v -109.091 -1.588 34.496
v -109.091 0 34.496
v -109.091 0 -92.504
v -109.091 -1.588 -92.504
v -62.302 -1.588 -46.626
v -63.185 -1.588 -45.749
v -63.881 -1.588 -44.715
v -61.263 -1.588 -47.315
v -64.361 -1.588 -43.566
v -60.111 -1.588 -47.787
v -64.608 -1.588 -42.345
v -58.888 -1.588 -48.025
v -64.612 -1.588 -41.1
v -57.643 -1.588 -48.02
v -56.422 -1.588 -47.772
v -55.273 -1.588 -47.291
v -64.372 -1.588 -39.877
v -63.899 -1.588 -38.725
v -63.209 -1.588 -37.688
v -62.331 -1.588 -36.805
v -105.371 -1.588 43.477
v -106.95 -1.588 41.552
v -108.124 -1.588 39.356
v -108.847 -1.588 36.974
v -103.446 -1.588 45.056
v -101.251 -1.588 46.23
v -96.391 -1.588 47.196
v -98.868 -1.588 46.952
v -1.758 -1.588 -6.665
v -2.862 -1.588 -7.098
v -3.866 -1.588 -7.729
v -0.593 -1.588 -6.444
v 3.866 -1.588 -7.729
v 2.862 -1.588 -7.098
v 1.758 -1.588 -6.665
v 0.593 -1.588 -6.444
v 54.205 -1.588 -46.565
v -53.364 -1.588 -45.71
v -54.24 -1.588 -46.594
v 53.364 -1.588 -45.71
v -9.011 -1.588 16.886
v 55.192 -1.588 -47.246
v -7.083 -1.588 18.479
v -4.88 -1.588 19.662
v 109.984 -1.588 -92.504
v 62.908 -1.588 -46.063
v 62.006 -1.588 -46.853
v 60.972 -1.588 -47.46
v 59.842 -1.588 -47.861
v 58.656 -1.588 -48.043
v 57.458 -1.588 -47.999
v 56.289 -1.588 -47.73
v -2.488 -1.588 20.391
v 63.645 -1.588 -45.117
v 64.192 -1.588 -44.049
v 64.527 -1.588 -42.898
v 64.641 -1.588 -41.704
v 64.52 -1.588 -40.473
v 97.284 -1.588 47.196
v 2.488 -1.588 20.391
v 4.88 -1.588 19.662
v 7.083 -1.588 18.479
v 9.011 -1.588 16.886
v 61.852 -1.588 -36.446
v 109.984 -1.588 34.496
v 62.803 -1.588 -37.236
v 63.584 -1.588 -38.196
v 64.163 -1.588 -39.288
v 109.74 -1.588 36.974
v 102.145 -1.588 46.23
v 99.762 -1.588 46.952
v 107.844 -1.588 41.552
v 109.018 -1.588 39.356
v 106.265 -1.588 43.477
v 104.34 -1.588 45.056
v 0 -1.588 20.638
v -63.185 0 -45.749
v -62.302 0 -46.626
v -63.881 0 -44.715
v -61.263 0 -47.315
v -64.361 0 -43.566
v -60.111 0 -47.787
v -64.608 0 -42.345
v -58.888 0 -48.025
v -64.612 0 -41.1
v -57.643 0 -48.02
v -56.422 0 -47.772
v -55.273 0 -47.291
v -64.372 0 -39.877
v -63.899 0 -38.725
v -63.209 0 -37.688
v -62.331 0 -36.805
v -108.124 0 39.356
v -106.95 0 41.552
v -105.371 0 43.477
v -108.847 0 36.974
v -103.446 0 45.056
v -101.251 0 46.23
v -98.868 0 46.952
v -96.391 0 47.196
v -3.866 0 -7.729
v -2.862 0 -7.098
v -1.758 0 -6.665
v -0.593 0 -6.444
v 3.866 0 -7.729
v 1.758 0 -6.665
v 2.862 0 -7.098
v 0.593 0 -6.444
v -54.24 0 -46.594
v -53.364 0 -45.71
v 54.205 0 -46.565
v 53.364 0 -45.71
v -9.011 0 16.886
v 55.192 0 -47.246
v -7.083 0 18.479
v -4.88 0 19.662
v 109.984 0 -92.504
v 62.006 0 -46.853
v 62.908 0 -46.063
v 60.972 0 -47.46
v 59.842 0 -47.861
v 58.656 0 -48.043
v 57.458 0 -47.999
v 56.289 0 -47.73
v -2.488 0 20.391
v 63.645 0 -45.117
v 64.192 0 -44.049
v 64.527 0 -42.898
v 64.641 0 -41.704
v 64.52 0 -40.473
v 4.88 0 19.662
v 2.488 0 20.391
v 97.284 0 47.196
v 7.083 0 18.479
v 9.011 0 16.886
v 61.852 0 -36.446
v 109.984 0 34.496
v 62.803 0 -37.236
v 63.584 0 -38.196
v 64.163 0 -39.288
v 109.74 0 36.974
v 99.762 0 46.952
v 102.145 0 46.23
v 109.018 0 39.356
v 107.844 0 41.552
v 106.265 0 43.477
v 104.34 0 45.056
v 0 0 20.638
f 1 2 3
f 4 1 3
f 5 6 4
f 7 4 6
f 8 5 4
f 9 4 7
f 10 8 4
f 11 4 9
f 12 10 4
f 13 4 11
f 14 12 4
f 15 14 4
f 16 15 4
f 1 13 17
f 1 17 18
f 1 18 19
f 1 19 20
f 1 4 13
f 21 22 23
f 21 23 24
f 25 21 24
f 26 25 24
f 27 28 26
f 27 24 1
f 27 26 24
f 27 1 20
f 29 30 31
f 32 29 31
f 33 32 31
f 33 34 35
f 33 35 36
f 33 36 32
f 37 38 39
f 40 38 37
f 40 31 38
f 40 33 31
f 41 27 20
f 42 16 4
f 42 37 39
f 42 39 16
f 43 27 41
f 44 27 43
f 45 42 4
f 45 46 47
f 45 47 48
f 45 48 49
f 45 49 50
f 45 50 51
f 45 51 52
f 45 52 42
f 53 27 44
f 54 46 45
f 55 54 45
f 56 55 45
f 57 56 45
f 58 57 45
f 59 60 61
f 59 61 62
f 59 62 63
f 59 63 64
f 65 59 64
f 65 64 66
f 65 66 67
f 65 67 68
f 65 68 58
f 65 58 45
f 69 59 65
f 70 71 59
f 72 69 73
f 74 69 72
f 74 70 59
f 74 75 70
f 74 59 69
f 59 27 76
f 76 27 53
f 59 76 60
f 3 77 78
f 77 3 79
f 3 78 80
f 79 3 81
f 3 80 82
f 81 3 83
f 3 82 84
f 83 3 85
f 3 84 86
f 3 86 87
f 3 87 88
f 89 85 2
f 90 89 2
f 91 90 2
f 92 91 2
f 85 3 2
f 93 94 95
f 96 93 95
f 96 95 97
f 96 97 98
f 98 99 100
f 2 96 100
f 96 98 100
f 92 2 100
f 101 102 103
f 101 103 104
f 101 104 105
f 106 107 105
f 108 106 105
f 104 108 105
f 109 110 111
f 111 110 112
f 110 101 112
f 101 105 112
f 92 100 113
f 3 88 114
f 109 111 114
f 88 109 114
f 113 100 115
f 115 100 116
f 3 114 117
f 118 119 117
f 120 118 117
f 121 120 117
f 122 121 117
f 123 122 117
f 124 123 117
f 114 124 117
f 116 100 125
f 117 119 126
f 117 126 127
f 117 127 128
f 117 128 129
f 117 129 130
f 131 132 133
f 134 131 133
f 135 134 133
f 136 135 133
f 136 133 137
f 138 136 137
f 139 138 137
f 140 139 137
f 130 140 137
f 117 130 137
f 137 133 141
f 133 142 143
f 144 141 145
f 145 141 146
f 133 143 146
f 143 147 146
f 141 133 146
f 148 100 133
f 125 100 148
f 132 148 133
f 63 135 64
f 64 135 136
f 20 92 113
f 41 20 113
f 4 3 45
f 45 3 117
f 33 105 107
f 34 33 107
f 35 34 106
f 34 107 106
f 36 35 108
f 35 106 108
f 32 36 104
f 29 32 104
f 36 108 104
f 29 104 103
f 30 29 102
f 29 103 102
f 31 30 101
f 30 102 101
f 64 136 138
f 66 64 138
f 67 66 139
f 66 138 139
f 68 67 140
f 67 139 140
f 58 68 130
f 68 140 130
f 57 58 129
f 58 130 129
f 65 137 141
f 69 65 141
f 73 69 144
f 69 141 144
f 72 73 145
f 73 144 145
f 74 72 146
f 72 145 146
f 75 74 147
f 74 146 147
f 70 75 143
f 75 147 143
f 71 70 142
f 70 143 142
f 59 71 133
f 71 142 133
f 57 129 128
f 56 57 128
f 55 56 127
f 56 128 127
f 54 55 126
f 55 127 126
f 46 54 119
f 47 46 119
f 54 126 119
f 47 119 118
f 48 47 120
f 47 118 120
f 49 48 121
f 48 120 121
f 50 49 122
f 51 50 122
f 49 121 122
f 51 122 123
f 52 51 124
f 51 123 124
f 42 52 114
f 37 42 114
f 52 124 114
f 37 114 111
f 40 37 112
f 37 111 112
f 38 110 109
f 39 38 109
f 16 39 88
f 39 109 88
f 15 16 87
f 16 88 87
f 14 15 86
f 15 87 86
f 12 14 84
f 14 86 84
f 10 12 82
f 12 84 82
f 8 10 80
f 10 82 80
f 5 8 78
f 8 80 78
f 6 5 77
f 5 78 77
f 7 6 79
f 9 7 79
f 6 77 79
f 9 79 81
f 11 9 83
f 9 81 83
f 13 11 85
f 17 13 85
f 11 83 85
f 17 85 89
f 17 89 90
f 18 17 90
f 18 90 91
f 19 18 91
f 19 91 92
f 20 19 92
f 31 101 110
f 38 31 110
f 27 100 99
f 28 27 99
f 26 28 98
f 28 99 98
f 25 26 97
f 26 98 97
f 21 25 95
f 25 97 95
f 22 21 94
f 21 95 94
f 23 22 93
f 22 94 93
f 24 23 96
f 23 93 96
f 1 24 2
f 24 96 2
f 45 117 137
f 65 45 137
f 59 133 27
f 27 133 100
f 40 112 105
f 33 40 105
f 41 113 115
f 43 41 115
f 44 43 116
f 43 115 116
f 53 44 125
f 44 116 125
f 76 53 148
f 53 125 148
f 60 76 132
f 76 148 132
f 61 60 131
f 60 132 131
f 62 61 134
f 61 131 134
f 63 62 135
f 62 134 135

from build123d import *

# Parameters (mm, degrees)
F1_DEPTH = 1.5875


# Not quite as in the source:
# - ends of sketch curves that miss each other by under 0.0002 mm in the source are joined


with BuildPart() as f1:
    # F0 (on Front) → F1 (new body)
    with BuildSketch(Plane.XZ):
        with BuildLine():
            Line((97.284460747, 47.1963935311), (-96.390539253, 47.1963935311))
            ThreePointArc((-96.390539253, 47.1963935311), (-105.370795374, 43.4766496521), (-109.090539253, 34.4963935311))
            Line((-109.090539253, 34.4963935311), (-109.090539253, -92.5036064689))
            Line((-109.090539253, -92.5036064689), (109.984460747, -92.5036064689))
            Line((109.984460747, -92.5036064689), (109.984460747, 34.4963935311))
            ThreePointArc((109.984460747, 34.4963935311), (106.2647168681, 43.4766496521), (97.284460747, 47.1963935311))
        make_face()
        with BuildLine():
            ThreePointArc((-53.3636475136, -45.7096316546), (-62.7650367506, -46.2093108693), (-62.3307099384, -36.8046758885))
            Line((-62.3307099384, -36.8046758885), (-9.0114088008, 16.8864949952))
            ThreePointArc((-9.0114088008, 16.8864949952), (4.2539e-06, 20.6375), (9.0114147958, 16.8864889585))
            Line((9.0114147958, 16.8864889585), (61.8517940181, -36.4462340741))
            ThreePointArc((61.8517940181, -36.4462340741), (63.9001946683, -38.7279945788), (64.640539253, -41.7036064689))
            ThreePointArc((64.640539253, -41.7036064689), (60.4161847378, -47.6872618127), (53.3636475136, -45.7096316546))
            Line((53.3636475136, -45.7096316546), (3.8656210952, -7.7286783496))
            ThreePointArc((3.8656210952, -7.7286783496), (0, -6.4164827869), (-3.8656210952, -7.7286783496))
            Line((-3.8656210952, -7.7286783496), (-53.3636475136, -45.7096316546))
        make_face(mode=Mode.SUBTRACT)
    extrude(amount=F1_DEPTH)


solid = f1.part
